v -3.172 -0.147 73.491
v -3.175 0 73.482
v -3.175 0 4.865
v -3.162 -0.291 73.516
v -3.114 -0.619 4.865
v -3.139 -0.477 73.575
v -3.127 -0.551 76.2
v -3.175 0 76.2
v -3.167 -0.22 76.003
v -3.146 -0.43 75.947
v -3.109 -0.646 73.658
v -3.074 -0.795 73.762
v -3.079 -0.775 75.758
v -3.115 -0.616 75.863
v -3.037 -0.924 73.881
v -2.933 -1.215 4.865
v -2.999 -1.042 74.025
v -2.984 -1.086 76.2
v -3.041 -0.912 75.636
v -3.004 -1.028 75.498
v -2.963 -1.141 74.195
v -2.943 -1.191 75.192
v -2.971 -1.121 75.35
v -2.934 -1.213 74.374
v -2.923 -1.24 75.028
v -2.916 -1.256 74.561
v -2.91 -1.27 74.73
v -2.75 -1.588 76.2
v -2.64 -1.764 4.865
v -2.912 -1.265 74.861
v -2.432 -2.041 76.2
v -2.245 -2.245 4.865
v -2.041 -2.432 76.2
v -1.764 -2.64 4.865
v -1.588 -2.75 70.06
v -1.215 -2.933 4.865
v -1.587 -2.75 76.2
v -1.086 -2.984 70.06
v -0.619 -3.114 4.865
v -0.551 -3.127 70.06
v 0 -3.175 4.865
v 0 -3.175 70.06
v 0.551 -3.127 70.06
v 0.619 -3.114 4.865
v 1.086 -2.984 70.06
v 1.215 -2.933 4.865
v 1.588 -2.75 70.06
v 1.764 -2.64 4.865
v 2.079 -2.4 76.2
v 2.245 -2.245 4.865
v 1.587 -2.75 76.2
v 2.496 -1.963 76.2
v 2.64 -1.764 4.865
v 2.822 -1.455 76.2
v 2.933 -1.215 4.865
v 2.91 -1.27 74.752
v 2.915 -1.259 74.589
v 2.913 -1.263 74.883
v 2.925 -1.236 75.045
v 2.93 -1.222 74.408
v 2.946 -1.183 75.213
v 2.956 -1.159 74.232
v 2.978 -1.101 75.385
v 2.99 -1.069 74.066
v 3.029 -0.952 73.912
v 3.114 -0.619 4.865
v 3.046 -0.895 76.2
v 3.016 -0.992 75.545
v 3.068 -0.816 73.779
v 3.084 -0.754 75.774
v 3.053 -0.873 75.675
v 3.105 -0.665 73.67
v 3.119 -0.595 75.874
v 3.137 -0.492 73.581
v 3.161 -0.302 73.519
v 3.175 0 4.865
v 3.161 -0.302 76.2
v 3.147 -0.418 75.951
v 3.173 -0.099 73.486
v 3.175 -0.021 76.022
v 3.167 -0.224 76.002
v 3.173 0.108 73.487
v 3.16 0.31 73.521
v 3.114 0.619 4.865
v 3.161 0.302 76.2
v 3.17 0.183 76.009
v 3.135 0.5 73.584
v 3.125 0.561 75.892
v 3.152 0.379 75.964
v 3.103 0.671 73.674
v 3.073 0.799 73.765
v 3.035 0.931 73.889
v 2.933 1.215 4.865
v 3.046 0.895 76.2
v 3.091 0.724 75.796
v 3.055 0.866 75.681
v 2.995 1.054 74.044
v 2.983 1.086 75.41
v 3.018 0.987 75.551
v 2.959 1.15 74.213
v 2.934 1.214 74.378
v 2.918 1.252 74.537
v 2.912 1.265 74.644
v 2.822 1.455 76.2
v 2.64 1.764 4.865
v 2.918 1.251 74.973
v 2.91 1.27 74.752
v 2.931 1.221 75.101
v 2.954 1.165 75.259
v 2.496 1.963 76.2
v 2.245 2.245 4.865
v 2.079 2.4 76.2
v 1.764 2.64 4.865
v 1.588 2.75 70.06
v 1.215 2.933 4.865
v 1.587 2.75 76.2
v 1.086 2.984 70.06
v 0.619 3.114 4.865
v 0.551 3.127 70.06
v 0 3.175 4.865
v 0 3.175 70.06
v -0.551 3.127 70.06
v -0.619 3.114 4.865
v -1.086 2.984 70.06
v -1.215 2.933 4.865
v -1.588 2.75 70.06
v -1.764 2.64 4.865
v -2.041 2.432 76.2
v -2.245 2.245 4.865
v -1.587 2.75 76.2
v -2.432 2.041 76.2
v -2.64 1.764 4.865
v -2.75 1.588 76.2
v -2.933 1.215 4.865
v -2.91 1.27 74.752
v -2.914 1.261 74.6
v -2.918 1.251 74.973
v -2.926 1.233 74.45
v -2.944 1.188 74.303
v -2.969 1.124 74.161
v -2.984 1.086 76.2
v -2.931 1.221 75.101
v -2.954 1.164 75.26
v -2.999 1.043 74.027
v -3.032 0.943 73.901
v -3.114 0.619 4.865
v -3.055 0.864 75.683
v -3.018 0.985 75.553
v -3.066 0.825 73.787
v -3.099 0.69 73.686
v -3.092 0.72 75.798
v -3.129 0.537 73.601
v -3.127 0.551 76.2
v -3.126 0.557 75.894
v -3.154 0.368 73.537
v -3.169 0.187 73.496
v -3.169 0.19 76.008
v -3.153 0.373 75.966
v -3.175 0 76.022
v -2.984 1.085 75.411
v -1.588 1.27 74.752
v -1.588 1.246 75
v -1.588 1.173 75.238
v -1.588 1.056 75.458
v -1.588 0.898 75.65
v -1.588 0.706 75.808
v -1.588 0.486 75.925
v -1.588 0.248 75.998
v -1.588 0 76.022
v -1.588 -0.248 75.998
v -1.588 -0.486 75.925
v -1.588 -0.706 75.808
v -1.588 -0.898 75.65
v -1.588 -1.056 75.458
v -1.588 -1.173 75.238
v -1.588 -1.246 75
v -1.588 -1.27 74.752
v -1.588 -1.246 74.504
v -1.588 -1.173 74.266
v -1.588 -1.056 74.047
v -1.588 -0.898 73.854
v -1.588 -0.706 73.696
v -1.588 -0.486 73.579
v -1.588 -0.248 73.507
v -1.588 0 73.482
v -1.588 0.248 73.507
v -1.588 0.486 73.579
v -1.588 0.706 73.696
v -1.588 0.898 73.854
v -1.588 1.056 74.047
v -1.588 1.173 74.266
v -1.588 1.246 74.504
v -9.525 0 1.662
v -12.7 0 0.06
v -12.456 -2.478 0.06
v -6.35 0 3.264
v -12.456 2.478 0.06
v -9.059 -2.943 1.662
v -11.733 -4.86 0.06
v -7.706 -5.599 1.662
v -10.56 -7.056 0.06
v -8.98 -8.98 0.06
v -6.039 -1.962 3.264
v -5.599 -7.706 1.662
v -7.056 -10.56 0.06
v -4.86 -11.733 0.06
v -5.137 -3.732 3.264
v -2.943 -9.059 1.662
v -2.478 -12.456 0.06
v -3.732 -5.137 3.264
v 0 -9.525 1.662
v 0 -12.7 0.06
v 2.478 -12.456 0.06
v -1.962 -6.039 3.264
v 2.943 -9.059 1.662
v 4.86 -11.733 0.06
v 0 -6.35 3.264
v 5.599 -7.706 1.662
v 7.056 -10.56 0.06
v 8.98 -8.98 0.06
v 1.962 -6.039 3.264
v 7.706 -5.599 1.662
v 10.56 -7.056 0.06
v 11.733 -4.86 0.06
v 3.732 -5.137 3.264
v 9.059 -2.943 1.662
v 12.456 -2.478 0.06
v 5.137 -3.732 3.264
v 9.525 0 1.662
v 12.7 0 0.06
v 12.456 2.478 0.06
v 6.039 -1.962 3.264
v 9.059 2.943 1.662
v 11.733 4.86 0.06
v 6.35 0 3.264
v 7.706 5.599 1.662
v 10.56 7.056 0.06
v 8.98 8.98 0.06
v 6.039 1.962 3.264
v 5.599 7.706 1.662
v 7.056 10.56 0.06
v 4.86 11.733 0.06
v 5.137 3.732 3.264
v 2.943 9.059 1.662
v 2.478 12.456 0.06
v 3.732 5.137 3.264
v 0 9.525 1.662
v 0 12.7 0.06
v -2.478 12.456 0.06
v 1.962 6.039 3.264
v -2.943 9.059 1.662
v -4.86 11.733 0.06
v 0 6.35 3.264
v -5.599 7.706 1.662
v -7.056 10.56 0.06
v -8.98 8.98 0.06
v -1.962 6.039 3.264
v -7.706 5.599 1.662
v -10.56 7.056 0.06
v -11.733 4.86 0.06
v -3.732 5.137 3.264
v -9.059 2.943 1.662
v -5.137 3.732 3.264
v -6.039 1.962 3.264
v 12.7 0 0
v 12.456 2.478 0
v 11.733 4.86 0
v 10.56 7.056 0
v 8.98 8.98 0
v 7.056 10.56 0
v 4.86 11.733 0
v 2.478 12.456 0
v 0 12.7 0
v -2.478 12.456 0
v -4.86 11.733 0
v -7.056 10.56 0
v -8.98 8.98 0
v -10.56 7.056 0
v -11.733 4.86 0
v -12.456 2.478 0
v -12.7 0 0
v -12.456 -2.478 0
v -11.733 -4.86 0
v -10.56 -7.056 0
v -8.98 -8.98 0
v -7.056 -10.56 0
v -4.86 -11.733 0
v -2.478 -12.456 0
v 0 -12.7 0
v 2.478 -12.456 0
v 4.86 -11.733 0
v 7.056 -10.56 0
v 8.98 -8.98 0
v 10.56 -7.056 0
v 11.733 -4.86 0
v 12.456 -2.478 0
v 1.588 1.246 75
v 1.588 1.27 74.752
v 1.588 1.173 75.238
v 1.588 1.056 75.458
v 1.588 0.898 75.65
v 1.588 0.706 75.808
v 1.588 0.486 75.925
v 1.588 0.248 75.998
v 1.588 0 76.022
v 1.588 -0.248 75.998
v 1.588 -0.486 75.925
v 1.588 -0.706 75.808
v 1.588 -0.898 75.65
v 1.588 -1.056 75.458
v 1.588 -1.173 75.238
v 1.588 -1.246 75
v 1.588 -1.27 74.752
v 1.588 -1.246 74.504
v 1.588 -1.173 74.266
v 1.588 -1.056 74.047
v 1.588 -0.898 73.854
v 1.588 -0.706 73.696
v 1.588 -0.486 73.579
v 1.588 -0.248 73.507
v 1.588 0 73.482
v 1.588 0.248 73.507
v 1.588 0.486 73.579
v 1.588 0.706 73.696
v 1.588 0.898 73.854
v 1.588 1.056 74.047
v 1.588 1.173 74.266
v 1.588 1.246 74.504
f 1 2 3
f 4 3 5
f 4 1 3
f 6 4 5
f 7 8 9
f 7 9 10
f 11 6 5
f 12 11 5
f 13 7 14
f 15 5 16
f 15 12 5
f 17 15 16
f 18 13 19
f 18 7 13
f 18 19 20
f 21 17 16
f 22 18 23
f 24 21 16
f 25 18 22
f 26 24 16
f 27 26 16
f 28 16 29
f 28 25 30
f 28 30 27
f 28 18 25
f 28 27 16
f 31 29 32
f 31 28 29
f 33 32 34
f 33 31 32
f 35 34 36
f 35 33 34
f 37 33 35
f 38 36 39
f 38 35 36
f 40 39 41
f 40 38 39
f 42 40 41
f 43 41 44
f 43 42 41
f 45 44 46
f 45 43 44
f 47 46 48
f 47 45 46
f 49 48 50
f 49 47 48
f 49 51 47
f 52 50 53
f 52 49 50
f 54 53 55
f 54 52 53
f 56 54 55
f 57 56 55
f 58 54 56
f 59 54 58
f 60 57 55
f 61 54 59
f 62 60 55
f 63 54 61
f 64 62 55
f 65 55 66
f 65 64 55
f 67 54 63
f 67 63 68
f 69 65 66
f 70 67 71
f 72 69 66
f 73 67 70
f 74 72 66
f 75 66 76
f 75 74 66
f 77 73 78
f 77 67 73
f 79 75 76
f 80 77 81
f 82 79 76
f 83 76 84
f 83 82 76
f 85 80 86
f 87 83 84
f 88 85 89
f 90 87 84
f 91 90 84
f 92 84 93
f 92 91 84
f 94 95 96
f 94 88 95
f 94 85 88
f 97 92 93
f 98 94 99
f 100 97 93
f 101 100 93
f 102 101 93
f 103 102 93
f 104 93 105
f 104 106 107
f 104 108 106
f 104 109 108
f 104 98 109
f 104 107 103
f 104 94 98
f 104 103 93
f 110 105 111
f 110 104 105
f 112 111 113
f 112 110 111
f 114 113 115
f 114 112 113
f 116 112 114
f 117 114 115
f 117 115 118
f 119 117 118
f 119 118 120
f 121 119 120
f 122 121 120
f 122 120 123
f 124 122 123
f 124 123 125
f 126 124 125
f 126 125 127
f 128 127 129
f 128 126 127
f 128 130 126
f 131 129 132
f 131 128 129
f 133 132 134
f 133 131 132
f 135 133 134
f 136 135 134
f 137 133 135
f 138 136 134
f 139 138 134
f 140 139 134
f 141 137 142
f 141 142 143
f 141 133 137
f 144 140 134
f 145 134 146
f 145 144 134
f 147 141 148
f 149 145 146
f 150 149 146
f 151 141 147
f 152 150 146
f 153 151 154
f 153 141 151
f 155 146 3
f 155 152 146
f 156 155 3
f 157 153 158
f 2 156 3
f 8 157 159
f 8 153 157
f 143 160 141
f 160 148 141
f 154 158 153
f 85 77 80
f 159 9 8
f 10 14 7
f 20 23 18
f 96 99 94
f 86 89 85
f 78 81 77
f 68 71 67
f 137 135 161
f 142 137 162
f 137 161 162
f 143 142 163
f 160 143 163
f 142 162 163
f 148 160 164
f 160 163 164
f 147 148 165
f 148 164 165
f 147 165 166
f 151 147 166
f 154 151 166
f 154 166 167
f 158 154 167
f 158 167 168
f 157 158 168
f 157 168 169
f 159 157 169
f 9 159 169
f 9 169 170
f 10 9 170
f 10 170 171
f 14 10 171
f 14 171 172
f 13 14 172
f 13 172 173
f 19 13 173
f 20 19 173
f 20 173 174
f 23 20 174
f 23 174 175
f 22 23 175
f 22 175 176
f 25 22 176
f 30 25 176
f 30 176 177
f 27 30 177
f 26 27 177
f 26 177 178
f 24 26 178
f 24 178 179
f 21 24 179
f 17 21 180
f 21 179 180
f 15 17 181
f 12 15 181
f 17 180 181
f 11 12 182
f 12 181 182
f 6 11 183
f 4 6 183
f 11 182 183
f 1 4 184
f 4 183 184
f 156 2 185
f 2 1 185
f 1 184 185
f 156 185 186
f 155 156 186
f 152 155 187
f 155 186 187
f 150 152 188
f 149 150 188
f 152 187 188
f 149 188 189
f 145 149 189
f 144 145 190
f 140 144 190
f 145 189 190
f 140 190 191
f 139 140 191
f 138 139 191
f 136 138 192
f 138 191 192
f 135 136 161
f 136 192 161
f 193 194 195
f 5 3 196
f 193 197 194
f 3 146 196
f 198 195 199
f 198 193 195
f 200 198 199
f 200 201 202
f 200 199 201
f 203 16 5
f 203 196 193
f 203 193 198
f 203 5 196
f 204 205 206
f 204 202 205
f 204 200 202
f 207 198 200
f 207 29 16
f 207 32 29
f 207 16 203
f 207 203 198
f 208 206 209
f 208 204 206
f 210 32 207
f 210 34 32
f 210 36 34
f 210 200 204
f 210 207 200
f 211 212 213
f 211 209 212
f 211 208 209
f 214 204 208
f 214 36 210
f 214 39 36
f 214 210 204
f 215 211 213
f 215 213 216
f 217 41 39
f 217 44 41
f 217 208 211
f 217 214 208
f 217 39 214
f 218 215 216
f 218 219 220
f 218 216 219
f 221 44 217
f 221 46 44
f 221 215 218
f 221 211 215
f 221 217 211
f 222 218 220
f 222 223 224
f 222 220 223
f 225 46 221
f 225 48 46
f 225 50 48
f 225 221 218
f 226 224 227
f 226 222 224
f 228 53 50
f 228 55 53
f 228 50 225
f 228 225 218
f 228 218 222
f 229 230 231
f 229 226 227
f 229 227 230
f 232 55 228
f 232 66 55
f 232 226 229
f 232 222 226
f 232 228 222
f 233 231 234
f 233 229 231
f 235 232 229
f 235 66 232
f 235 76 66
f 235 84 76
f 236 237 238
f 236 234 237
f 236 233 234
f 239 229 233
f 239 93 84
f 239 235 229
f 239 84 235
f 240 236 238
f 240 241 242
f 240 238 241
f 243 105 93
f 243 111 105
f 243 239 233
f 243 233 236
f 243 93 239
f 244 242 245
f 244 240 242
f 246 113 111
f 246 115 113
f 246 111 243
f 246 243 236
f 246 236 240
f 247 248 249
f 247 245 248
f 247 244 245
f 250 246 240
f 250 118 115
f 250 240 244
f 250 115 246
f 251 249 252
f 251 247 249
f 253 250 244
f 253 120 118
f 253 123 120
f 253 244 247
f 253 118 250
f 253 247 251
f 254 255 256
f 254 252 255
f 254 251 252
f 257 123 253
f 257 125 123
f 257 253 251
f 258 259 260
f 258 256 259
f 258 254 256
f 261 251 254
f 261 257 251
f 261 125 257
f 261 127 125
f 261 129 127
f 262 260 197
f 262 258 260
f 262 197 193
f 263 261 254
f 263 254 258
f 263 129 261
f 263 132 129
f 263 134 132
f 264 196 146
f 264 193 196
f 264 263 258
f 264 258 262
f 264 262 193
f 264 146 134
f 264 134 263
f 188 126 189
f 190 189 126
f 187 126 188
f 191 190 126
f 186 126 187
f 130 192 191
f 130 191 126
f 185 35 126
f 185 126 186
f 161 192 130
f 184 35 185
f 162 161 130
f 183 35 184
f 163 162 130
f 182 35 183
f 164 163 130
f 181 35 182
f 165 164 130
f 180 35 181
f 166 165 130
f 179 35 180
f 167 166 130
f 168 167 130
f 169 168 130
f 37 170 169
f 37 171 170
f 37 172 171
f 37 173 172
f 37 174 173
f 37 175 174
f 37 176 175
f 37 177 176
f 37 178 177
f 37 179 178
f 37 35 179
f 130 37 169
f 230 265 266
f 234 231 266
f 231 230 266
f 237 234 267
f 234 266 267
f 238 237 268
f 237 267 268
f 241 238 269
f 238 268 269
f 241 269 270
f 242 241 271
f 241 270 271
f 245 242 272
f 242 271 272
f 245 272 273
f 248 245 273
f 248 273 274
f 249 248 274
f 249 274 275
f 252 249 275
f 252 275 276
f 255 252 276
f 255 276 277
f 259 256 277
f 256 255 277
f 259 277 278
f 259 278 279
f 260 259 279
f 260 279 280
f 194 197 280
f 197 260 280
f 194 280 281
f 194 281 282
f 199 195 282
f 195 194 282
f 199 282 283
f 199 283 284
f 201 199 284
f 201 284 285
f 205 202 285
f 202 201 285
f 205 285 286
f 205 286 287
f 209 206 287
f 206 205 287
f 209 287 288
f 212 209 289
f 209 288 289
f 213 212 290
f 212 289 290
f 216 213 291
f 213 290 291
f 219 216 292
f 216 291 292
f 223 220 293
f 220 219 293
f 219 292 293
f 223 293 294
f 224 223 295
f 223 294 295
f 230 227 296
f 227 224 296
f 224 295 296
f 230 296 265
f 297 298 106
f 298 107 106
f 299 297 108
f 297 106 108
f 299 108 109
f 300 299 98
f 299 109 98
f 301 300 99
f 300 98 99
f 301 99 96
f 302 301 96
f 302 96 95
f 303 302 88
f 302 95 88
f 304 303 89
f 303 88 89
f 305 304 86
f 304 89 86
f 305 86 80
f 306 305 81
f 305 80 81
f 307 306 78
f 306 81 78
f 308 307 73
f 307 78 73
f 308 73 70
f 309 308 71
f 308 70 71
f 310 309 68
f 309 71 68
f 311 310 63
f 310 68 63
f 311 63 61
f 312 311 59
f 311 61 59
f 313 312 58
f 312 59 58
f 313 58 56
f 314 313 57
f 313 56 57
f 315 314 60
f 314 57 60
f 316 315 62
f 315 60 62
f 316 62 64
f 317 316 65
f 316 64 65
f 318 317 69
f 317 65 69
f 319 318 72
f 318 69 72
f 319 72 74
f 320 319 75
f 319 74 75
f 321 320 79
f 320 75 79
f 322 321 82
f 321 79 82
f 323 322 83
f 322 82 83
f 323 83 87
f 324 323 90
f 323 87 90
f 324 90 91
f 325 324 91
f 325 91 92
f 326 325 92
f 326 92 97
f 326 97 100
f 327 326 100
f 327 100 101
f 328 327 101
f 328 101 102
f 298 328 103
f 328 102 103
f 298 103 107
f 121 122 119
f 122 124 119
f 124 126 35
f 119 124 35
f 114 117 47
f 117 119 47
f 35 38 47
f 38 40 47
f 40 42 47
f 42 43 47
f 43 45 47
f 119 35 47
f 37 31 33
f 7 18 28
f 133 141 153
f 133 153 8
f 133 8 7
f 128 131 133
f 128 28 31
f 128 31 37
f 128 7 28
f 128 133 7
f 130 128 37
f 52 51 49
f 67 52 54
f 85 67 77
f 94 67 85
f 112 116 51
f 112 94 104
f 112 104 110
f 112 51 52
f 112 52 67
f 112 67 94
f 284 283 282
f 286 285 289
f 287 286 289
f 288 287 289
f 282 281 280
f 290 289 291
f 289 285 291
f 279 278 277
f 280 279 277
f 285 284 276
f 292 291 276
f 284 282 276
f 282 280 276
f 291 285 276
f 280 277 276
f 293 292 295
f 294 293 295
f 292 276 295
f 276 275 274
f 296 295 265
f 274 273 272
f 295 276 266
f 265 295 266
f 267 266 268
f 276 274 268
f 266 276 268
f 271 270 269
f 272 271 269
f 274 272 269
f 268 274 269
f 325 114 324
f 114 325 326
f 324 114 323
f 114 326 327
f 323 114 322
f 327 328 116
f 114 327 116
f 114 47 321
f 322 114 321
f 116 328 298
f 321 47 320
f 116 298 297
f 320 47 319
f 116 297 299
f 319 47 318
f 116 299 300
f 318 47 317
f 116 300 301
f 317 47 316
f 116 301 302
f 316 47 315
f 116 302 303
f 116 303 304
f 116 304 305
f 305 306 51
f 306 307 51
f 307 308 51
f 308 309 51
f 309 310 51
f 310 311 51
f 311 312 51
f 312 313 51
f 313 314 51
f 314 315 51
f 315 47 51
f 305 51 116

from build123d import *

# Parameters (mm, degrees)
F0_R     = 12.7
F1_DEPTH = 76.2
F4_W     = 3.175
F4_H     = 12.7
F5_DEPTH = 12.7
F6_R     = 1.27
F7_DEPTH = 12.7


with BuildPart() as f1:
    # F0 (on Top) → F1 (new body)
    with BuildSketch(Plane.XY):
        Circle(F0_R)
    extrude(amount=F1_DEPTH)

    # F2 (on Front) → F3 (revolve, cut)
    with BuildSketch(Plane.XZ):
        Polygon((-17.214077, -2.216983), (-3.175, 4.865219), (-3.175, 83.753079), (-17.214077, 83.753079), align=None)
    revolve(axis=Axis((0, 0, 76.2), (0, 0, 1)), mode=Mode.SUBTRACT)

    # F4 (on Front) → F5 (cut, symmetric)
    with BuildSketch(Plane.XZ):
        with Locations((0, 76.409727)):
            Rectangle(F4_W, F4_H)
    extrude(amount=F5_DEPTH, both=True, mode=Mode.SUBTRACT)

    # F6 (on Right) → F7 (cut, symmetric)
    with BuildSketch(Plane.YZ):
        with Locations((0, 74.752115)):
            Circle(F6_R)
    extrude(amount=F7_DEPTH, both=True, mode=Mode.SUBTRACT)


solid = f1.part
